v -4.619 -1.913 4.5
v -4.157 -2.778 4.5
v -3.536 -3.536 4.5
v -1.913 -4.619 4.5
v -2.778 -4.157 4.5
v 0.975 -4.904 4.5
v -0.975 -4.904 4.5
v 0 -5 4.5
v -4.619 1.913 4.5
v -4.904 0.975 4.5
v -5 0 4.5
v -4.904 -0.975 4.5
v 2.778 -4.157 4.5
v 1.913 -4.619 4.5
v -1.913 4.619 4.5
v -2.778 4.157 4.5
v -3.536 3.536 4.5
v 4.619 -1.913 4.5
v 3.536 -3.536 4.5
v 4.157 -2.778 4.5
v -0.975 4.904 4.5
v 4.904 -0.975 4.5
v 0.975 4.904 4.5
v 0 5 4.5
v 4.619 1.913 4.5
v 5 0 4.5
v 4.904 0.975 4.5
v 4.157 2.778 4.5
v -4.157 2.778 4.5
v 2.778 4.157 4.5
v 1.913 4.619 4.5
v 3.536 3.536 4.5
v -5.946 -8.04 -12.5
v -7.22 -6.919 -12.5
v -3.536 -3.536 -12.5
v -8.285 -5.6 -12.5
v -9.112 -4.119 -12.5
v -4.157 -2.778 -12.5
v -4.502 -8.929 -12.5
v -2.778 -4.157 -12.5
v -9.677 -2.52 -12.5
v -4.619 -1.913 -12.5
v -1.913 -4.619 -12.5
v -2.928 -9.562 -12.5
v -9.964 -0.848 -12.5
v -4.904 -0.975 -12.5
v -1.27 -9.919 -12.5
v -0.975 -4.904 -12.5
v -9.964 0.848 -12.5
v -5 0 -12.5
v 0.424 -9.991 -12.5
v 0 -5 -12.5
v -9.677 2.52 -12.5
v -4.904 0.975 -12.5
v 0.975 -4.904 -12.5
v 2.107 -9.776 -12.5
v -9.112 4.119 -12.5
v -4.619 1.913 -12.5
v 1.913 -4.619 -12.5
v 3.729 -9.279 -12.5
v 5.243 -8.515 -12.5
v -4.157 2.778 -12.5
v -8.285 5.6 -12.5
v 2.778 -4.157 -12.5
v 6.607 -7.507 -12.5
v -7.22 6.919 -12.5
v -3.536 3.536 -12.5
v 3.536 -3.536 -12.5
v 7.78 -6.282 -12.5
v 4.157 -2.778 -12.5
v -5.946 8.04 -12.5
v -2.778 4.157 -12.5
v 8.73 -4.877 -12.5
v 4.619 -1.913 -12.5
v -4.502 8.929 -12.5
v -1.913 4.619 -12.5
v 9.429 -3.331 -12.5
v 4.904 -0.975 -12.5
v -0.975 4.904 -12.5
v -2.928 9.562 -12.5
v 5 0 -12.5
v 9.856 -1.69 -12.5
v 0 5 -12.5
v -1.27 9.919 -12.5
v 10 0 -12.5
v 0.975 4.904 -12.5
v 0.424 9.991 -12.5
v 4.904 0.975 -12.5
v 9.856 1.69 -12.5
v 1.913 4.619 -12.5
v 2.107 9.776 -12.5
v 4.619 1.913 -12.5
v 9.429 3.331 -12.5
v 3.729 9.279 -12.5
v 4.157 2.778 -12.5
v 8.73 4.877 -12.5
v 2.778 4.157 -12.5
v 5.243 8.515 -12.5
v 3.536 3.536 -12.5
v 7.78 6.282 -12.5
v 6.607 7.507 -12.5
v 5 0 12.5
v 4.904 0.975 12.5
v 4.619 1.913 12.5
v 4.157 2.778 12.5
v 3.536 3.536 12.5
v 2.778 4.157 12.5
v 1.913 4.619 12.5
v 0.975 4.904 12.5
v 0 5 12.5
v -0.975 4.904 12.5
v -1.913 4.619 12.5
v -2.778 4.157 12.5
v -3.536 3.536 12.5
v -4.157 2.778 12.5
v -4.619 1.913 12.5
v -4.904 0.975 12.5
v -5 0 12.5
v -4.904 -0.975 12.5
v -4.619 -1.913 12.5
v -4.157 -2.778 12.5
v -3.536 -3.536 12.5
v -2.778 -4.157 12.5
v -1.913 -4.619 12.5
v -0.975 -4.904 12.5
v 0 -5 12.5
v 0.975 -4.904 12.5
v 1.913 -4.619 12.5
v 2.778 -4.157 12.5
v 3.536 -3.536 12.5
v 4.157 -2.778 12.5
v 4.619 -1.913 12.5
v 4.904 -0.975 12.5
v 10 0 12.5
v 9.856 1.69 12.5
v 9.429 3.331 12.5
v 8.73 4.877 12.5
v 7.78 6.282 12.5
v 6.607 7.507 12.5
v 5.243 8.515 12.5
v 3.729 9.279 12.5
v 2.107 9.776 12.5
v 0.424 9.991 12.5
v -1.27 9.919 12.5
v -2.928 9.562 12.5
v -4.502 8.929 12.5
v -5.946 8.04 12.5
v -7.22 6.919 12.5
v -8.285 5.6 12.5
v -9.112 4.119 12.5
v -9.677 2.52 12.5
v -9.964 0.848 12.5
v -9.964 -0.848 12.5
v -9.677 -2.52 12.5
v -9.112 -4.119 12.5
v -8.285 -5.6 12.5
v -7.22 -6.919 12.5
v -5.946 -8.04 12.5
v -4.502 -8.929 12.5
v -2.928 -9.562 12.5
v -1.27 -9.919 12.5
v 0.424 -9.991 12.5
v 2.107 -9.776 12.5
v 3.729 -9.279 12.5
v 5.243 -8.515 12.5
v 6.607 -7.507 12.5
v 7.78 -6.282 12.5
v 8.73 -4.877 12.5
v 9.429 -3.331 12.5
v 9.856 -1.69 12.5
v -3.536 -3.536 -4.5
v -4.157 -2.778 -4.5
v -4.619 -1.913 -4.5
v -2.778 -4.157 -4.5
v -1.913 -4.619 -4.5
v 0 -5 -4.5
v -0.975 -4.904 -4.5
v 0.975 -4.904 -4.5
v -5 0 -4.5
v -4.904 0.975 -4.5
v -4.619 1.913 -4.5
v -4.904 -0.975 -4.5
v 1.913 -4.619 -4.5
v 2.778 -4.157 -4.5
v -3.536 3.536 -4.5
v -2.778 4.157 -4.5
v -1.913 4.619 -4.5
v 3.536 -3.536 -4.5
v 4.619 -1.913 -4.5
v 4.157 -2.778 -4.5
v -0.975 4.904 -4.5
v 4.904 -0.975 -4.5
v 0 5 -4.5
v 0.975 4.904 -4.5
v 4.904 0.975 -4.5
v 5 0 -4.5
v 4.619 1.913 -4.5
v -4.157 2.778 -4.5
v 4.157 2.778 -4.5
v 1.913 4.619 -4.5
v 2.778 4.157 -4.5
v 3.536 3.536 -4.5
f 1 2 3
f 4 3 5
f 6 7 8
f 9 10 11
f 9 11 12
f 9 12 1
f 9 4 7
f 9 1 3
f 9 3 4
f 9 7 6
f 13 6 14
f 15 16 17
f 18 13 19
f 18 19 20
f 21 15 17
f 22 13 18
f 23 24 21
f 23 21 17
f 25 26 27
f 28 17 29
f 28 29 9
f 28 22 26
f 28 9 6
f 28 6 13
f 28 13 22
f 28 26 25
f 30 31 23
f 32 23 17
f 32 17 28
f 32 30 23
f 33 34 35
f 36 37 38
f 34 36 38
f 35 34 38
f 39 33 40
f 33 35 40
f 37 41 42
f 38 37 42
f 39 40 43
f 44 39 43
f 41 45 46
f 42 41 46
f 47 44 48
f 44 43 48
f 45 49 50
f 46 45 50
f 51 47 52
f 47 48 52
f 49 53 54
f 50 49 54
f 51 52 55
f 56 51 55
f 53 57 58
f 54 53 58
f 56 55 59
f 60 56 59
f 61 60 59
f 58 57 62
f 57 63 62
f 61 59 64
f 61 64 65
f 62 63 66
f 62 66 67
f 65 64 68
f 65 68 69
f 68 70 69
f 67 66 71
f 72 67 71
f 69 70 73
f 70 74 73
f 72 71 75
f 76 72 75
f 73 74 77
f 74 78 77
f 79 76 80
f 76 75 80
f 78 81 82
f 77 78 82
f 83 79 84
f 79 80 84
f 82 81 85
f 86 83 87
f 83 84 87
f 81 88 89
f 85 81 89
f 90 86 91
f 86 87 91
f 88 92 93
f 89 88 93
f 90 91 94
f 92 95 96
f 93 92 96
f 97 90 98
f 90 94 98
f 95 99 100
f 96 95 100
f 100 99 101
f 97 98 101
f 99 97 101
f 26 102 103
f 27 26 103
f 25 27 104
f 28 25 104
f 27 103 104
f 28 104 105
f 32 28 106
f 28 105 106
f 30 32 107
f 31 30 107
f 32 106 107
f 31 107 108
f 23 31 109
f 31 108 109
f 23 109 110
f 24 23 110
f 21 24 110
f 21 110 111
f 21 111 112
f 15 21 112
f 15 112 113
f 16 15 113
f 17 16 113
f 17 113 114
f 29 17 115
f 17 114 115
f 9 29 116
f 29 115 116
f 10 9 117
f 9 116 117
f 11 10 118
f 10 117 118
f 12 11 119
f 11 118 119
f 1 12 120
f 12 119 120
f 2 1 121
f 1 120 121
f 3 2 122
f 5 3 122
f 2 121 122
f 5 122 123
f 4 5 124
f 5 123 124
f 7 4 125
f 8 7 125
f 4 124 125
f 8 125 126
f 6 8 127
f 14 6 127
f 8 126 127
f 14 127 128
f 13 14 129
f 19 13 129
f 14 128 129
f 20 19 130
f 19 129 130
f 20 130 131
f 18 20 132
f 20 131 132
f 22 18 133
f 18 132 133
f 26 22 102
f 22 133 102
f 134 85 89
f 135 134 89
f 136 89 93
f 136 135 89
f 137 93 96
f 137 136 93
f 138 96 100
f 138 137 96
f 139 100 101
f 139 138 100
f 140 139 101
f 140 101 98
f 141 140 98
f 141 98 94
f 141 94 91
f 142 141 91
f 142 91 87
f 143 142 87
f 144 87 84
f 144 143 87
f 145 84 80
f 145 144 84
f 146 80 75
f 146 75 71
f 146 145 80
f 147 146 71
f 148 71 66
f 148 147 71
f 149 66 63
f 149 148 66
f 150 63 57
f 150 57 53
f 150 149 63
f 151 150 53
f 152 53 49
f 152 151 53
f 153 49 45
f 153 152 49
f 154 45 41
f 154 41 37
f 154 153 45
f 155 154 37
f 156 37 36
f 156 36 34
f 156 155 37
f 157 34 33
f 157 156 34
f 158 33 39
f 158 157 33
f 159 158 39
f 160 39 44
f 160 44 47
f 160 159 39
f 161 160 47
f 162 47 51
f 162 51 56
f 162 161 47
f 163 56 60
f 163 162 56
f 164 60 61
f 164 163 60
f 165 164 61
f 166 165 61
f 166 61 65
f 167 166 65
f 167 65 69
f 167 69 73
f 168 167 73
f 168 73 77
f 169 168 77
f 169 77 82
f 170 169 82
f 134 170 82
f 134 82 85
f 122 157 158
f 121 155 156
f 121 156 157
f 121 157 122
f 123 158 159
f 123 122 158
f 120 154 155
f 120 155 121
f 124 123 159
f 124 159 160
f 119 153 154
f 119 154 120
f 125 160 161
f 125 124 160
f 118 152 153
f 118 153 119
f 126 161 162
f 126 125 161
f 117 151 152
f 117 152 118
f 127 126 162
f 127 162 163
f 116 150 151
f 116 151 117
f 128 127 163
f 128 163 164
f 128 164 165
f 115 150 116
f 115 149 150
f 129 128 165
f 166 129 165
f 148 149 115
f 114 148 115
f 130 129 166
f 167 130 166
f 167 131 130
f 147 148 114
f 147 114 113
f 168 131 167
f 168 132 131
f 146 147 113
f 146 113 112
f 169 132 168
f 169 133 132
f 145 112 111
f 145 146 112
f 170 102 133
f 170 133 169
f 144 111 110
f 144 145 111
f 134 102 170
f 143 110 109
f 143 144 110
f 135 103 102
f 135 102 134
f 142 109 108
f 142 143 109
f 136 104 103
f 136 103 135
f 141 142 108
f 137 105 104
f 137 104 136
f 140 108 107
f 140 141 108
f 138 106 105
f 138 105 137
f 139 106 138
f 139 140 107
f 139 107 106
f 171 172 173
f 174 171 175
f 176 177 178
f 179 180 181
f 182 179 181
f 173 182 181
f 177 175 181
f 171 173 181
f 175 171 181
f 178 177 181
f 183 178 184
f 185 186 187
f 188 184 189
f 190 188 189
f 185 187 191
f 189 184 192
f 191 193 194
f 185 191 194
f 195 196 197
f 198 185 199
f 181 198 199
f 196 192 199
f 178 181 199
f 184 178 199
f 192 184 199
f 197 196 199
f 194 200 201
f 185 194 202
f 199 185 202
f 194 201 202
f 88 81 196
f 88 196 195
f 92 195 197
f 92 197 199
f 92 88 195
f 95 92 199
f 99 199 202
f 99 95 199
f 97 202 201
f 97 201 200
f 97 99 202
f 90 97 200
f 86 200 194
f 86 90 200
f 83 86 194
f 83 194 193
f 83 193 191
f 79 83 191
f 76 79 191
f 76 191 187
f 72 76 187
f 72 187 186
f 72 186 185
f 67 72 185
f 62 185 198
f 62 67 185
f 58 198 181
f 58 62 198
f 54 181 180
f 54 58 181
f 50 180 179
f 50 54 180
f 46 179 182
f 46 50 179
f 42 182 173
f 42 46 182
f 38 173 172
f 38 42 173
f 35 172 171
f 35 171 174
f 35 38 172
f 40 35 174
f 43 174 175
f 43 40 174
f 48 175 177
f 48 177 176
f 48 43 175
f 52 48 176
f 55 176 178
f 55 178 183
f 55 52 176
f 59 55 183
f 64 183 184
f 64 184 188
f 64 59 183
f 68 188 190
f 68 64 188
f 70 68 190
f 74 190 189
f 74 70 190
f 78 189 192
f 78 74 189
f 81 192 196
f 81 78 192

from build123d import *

# Parameters (mm, degrees)
SKETCH1_R           = 10
BOSS_EXTRUDE1_DEPTH = 12.5
SKETCH2_R           = 5
CUT_EXTRUDE2_DEPTH  = 8


with BuildPart() as part:
    # Sketch1 → Boss-Extrude1 (new body, symmetric)
    with BuildSketch(Plane.XY):
        Circle(SKETCH1_R)
    extrude(amount=BOSS_EXTRUDE1_DEPTH, both=True)

    # Sketch2 → Cut-Extrude2 (cut)
    with BuildSketch(Plane.XY.offset(12.5)):
        Circle(SKETCH2_R)
    cut_extrude2 = extrude(amount=-CUT_EXTRUDE2_DEPTH, mode=Mode.SUBTRACT)

    # Mirror1: Cut-Extrude2 across plane
    add(cut_extrude2.mirror(Plane.XY), mode=Mode.SUBTRACT)


solid = part.part
